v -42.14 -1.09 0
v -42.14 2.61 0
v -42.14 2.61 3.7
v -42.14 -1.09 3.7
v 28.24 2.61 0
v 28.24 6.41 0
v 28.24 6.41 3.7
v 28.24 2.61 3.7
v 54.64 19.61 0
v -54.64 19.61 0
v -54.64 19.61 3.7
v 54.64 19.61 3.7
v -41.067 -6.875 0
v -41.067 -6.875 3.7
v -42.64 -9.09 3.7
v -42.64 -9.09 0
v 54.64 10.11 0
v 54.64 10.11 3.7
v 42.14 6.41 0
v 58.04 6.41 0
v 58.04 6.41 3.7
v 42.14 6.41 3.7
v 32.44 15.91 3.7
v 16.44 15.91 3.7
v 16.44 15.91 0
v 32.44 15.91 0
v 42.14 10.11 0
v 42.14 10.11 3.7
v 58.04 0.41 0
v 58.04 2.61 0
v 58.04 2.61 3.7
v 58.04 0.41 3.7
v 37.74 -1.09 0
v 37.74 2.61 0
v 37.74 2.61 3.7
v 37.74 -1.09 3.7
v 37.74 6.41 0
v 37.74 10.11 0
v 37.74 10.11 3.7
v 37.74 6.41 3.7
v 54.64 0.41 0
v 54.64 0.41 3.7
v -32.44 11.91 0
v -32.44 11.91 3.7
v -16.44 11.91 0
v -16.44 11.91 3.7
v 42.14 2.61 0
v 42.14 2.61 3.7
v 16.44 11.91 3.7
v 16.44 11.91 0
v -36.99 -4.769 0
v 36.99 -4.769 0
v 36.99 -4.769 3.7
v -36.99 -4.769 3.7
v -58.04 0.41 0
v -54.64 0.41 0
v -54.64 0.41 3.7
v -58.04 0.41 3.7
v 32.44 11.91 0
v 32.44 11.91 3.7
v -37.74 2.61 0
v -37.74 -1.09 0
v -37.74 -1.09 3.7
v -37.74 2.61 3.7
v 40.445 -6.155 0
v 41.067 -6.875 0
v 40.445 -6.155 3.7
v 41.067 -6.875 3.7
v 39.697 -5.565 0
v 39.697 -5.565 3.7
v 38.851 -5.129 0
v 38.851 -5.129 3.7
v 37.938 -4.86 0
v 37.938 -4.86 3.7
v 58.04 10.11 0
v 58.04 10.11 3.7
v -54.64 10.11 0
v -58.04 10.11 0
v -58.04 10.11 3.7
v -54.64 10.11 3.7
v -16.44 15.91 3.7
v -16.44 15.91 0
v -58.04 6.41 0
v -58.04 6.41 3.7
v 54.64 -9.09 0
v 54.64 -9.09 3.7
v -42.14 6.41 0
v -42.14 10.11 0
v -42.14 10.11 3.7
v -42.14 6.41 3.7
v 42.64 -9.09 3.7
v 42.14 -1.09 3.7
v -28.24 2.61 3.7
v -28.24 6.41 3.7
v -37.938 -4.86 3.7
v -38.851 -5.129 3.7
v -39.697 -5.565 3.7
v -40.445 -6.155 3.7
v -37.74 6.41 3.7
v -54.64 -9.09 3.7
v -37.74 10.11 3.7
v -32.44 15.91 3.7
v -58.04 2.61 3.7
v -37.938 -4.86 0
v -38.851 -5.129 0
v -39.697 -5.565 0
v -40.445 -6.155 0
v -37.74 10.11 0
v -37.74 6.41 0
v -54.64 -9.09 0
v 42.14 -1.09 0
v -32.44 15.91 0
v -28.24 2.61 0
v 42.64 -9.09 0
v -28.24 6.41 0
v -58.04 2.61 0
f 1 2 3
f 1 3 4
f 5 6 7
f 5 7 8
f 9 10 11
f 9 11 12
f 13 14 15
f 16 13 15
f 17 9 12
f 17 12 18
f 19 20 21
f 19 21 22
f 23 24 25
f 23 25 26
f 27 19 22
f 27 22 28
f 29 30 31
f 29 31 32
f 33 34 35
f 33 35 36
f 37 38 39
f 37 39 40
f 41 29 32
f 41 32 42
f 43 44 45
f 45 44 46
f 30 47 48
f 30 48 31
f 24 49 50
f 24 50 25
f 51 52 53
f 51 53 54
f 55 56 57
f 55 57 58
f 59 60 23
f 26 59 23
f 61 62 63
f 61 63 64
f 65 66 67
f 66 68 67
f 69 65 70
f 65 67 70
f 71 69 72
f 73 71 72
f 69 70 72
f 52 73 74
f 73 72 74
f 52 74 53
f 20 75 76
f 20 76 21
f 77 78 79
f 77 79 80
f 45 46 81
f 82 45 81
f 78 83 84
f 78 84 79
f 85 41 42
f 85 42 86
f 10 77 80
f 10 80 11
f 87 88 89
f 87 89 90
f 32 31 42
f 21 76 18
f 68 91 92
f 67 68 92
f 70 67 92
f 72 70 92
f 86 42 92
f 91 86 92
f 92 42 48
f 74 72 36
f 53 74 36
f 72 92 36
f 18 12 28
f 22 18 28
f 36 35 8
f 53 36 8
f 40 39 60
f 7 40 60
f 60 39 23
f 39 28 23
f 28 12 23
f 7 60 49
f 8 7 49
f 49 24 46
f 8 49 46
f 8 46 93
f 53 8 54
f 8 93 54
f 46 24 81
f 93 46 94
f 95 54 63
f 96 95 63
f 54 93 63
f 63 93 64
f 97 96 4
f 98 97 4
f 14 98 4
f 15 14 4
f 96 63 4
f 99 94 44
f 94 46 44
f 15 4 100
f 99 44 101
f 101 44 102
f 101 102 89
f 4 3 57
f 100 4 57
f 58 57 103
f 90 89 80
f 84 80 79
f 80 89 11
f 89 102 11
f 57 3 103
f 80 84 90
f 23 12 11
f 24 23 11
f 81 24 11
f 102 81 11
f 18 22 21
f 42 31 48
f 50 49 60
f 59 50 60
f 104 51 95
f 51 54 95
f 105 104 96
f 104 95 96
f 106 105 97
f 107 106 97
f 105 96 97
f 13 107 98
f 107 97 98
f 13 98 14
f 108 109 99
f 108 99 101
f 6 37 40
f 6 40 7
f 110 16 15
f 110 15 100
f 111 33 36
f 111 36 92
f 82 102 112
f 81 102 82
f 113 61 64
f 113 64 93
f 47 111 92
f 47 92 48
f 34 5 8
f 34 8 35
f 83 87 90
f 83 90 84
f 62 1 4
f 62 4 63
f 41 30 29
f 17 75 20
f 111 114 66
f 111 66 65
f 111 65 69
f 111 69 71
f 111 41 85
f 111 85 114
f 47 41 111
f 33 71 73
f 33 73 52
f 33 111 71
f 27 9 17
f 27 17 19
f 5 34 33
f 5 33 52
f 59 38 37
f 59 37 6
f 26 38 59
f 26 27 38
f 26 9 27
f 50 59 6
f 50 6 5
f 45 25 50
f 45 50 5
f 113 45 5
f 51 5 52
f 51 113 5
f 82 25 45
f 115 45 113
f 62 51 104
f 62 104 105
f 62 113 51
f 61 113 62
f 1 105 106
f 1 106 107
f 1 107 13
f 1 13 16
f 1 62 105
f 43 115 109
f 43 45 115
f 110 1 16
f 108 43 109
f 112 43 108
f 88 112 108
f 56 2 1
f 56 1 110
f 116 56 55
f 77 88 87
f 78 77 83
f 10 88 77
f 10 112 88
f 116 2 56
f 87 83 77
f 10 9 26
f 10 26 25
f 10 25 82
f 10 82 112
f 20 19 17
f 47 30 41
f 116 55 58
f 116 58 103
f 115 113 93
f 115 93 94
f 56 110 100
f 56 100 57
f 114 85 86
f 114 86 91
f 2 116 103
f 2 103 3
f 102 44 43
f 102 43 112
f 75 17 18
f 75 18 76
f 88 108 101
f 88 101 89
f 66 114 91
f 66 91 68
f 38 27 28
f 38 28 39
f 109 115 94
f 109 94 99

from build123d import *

# Parameters (mm, degrees)
BOSS_EXTRUDE1_DEPTH = 3.7
FILLET1_R           = 5
SKETCH3_W           = 16
SKETCH3_H           = 4
CUT_EXTRUDE1_DEPTH  = 62.374947331


with BuildPart() as part:
    # Sketch2 → Boss-Extrude1 (new body)
    with BuildSketch(Plane.XY):
        Polygon((-54.64, 19.610011726), (54.64, 19.610011726), (54.64, 10.110011726), (58.04, 10.110011726), (58.04, 6.410011726), (42.14, 6.410011726), (42.14, 10.110011726), (37.74, 10.110011726), (37.74, 6.410011726), (28.24, 6.410011726), (28.24, 2.610011726), (37.74, 2.610011726), (37.74, -1.089988274), (42.14, -1.089988274), (42.14, 2.610011726), (58.04, 2.610011726), (58.04, 0.410011726), (54.64, 0.410011726), (54.64, -9.089988274), (42.64, -9.089988274), (39.572296355, -4.769343347), (-39.572296355, -4.769343347), (-42.64, -9.089988274), (-54.64, -9.089988274), (-54.64, 0.410011726), (-58.04, 0.410011726), (-58.04, 2.610011726), (-42.14, 2.610011726), (-42.14, -1.089988274), (-37.74, -1.089988274), (-37.74, 2.610011726), (-28.24, 2.610011726), (-28.24, 6.410011726), (-37.74, 6.410011726), (-37.74, 10.110011726), (-42.14, 10.110011726), (-42.14, 6.410011726), (-58.04, 6.410011726), (-58.04, 10.110011726), (-54.64, 10.110011726), align=None)
    extrude(amount=BOSS_EXTRUDE1_DEPTH)

    # Fillet1
    fillet1_edges = [part.edges().sort_by_distance(p)[0] for p in [
        (39.572296355, -4.769343347, 1.85),
        (-39.572296355, -4.769343347, 1.85),
    ]]
    fillet(fillet1_edges, radius=FILLET1_R)

    # Sketch3 → Cut-Extrude1 (cut, through all)
    with BuildSketch(Plane.XY.offset(3.7)):
        with Locations((24.44, 13.910011726)):
            Rectangle(SKETCH3_W, SKETCH3_H)
        with Locations((-24.44, 13.910011726)):
            Rectangle(SKETCH3_W, SKETCH3_H)
    extrude(amount=-CUT_EXTRUDE1_DEPTH, mode=Mode.SUBTRACT)


solid = part.part
